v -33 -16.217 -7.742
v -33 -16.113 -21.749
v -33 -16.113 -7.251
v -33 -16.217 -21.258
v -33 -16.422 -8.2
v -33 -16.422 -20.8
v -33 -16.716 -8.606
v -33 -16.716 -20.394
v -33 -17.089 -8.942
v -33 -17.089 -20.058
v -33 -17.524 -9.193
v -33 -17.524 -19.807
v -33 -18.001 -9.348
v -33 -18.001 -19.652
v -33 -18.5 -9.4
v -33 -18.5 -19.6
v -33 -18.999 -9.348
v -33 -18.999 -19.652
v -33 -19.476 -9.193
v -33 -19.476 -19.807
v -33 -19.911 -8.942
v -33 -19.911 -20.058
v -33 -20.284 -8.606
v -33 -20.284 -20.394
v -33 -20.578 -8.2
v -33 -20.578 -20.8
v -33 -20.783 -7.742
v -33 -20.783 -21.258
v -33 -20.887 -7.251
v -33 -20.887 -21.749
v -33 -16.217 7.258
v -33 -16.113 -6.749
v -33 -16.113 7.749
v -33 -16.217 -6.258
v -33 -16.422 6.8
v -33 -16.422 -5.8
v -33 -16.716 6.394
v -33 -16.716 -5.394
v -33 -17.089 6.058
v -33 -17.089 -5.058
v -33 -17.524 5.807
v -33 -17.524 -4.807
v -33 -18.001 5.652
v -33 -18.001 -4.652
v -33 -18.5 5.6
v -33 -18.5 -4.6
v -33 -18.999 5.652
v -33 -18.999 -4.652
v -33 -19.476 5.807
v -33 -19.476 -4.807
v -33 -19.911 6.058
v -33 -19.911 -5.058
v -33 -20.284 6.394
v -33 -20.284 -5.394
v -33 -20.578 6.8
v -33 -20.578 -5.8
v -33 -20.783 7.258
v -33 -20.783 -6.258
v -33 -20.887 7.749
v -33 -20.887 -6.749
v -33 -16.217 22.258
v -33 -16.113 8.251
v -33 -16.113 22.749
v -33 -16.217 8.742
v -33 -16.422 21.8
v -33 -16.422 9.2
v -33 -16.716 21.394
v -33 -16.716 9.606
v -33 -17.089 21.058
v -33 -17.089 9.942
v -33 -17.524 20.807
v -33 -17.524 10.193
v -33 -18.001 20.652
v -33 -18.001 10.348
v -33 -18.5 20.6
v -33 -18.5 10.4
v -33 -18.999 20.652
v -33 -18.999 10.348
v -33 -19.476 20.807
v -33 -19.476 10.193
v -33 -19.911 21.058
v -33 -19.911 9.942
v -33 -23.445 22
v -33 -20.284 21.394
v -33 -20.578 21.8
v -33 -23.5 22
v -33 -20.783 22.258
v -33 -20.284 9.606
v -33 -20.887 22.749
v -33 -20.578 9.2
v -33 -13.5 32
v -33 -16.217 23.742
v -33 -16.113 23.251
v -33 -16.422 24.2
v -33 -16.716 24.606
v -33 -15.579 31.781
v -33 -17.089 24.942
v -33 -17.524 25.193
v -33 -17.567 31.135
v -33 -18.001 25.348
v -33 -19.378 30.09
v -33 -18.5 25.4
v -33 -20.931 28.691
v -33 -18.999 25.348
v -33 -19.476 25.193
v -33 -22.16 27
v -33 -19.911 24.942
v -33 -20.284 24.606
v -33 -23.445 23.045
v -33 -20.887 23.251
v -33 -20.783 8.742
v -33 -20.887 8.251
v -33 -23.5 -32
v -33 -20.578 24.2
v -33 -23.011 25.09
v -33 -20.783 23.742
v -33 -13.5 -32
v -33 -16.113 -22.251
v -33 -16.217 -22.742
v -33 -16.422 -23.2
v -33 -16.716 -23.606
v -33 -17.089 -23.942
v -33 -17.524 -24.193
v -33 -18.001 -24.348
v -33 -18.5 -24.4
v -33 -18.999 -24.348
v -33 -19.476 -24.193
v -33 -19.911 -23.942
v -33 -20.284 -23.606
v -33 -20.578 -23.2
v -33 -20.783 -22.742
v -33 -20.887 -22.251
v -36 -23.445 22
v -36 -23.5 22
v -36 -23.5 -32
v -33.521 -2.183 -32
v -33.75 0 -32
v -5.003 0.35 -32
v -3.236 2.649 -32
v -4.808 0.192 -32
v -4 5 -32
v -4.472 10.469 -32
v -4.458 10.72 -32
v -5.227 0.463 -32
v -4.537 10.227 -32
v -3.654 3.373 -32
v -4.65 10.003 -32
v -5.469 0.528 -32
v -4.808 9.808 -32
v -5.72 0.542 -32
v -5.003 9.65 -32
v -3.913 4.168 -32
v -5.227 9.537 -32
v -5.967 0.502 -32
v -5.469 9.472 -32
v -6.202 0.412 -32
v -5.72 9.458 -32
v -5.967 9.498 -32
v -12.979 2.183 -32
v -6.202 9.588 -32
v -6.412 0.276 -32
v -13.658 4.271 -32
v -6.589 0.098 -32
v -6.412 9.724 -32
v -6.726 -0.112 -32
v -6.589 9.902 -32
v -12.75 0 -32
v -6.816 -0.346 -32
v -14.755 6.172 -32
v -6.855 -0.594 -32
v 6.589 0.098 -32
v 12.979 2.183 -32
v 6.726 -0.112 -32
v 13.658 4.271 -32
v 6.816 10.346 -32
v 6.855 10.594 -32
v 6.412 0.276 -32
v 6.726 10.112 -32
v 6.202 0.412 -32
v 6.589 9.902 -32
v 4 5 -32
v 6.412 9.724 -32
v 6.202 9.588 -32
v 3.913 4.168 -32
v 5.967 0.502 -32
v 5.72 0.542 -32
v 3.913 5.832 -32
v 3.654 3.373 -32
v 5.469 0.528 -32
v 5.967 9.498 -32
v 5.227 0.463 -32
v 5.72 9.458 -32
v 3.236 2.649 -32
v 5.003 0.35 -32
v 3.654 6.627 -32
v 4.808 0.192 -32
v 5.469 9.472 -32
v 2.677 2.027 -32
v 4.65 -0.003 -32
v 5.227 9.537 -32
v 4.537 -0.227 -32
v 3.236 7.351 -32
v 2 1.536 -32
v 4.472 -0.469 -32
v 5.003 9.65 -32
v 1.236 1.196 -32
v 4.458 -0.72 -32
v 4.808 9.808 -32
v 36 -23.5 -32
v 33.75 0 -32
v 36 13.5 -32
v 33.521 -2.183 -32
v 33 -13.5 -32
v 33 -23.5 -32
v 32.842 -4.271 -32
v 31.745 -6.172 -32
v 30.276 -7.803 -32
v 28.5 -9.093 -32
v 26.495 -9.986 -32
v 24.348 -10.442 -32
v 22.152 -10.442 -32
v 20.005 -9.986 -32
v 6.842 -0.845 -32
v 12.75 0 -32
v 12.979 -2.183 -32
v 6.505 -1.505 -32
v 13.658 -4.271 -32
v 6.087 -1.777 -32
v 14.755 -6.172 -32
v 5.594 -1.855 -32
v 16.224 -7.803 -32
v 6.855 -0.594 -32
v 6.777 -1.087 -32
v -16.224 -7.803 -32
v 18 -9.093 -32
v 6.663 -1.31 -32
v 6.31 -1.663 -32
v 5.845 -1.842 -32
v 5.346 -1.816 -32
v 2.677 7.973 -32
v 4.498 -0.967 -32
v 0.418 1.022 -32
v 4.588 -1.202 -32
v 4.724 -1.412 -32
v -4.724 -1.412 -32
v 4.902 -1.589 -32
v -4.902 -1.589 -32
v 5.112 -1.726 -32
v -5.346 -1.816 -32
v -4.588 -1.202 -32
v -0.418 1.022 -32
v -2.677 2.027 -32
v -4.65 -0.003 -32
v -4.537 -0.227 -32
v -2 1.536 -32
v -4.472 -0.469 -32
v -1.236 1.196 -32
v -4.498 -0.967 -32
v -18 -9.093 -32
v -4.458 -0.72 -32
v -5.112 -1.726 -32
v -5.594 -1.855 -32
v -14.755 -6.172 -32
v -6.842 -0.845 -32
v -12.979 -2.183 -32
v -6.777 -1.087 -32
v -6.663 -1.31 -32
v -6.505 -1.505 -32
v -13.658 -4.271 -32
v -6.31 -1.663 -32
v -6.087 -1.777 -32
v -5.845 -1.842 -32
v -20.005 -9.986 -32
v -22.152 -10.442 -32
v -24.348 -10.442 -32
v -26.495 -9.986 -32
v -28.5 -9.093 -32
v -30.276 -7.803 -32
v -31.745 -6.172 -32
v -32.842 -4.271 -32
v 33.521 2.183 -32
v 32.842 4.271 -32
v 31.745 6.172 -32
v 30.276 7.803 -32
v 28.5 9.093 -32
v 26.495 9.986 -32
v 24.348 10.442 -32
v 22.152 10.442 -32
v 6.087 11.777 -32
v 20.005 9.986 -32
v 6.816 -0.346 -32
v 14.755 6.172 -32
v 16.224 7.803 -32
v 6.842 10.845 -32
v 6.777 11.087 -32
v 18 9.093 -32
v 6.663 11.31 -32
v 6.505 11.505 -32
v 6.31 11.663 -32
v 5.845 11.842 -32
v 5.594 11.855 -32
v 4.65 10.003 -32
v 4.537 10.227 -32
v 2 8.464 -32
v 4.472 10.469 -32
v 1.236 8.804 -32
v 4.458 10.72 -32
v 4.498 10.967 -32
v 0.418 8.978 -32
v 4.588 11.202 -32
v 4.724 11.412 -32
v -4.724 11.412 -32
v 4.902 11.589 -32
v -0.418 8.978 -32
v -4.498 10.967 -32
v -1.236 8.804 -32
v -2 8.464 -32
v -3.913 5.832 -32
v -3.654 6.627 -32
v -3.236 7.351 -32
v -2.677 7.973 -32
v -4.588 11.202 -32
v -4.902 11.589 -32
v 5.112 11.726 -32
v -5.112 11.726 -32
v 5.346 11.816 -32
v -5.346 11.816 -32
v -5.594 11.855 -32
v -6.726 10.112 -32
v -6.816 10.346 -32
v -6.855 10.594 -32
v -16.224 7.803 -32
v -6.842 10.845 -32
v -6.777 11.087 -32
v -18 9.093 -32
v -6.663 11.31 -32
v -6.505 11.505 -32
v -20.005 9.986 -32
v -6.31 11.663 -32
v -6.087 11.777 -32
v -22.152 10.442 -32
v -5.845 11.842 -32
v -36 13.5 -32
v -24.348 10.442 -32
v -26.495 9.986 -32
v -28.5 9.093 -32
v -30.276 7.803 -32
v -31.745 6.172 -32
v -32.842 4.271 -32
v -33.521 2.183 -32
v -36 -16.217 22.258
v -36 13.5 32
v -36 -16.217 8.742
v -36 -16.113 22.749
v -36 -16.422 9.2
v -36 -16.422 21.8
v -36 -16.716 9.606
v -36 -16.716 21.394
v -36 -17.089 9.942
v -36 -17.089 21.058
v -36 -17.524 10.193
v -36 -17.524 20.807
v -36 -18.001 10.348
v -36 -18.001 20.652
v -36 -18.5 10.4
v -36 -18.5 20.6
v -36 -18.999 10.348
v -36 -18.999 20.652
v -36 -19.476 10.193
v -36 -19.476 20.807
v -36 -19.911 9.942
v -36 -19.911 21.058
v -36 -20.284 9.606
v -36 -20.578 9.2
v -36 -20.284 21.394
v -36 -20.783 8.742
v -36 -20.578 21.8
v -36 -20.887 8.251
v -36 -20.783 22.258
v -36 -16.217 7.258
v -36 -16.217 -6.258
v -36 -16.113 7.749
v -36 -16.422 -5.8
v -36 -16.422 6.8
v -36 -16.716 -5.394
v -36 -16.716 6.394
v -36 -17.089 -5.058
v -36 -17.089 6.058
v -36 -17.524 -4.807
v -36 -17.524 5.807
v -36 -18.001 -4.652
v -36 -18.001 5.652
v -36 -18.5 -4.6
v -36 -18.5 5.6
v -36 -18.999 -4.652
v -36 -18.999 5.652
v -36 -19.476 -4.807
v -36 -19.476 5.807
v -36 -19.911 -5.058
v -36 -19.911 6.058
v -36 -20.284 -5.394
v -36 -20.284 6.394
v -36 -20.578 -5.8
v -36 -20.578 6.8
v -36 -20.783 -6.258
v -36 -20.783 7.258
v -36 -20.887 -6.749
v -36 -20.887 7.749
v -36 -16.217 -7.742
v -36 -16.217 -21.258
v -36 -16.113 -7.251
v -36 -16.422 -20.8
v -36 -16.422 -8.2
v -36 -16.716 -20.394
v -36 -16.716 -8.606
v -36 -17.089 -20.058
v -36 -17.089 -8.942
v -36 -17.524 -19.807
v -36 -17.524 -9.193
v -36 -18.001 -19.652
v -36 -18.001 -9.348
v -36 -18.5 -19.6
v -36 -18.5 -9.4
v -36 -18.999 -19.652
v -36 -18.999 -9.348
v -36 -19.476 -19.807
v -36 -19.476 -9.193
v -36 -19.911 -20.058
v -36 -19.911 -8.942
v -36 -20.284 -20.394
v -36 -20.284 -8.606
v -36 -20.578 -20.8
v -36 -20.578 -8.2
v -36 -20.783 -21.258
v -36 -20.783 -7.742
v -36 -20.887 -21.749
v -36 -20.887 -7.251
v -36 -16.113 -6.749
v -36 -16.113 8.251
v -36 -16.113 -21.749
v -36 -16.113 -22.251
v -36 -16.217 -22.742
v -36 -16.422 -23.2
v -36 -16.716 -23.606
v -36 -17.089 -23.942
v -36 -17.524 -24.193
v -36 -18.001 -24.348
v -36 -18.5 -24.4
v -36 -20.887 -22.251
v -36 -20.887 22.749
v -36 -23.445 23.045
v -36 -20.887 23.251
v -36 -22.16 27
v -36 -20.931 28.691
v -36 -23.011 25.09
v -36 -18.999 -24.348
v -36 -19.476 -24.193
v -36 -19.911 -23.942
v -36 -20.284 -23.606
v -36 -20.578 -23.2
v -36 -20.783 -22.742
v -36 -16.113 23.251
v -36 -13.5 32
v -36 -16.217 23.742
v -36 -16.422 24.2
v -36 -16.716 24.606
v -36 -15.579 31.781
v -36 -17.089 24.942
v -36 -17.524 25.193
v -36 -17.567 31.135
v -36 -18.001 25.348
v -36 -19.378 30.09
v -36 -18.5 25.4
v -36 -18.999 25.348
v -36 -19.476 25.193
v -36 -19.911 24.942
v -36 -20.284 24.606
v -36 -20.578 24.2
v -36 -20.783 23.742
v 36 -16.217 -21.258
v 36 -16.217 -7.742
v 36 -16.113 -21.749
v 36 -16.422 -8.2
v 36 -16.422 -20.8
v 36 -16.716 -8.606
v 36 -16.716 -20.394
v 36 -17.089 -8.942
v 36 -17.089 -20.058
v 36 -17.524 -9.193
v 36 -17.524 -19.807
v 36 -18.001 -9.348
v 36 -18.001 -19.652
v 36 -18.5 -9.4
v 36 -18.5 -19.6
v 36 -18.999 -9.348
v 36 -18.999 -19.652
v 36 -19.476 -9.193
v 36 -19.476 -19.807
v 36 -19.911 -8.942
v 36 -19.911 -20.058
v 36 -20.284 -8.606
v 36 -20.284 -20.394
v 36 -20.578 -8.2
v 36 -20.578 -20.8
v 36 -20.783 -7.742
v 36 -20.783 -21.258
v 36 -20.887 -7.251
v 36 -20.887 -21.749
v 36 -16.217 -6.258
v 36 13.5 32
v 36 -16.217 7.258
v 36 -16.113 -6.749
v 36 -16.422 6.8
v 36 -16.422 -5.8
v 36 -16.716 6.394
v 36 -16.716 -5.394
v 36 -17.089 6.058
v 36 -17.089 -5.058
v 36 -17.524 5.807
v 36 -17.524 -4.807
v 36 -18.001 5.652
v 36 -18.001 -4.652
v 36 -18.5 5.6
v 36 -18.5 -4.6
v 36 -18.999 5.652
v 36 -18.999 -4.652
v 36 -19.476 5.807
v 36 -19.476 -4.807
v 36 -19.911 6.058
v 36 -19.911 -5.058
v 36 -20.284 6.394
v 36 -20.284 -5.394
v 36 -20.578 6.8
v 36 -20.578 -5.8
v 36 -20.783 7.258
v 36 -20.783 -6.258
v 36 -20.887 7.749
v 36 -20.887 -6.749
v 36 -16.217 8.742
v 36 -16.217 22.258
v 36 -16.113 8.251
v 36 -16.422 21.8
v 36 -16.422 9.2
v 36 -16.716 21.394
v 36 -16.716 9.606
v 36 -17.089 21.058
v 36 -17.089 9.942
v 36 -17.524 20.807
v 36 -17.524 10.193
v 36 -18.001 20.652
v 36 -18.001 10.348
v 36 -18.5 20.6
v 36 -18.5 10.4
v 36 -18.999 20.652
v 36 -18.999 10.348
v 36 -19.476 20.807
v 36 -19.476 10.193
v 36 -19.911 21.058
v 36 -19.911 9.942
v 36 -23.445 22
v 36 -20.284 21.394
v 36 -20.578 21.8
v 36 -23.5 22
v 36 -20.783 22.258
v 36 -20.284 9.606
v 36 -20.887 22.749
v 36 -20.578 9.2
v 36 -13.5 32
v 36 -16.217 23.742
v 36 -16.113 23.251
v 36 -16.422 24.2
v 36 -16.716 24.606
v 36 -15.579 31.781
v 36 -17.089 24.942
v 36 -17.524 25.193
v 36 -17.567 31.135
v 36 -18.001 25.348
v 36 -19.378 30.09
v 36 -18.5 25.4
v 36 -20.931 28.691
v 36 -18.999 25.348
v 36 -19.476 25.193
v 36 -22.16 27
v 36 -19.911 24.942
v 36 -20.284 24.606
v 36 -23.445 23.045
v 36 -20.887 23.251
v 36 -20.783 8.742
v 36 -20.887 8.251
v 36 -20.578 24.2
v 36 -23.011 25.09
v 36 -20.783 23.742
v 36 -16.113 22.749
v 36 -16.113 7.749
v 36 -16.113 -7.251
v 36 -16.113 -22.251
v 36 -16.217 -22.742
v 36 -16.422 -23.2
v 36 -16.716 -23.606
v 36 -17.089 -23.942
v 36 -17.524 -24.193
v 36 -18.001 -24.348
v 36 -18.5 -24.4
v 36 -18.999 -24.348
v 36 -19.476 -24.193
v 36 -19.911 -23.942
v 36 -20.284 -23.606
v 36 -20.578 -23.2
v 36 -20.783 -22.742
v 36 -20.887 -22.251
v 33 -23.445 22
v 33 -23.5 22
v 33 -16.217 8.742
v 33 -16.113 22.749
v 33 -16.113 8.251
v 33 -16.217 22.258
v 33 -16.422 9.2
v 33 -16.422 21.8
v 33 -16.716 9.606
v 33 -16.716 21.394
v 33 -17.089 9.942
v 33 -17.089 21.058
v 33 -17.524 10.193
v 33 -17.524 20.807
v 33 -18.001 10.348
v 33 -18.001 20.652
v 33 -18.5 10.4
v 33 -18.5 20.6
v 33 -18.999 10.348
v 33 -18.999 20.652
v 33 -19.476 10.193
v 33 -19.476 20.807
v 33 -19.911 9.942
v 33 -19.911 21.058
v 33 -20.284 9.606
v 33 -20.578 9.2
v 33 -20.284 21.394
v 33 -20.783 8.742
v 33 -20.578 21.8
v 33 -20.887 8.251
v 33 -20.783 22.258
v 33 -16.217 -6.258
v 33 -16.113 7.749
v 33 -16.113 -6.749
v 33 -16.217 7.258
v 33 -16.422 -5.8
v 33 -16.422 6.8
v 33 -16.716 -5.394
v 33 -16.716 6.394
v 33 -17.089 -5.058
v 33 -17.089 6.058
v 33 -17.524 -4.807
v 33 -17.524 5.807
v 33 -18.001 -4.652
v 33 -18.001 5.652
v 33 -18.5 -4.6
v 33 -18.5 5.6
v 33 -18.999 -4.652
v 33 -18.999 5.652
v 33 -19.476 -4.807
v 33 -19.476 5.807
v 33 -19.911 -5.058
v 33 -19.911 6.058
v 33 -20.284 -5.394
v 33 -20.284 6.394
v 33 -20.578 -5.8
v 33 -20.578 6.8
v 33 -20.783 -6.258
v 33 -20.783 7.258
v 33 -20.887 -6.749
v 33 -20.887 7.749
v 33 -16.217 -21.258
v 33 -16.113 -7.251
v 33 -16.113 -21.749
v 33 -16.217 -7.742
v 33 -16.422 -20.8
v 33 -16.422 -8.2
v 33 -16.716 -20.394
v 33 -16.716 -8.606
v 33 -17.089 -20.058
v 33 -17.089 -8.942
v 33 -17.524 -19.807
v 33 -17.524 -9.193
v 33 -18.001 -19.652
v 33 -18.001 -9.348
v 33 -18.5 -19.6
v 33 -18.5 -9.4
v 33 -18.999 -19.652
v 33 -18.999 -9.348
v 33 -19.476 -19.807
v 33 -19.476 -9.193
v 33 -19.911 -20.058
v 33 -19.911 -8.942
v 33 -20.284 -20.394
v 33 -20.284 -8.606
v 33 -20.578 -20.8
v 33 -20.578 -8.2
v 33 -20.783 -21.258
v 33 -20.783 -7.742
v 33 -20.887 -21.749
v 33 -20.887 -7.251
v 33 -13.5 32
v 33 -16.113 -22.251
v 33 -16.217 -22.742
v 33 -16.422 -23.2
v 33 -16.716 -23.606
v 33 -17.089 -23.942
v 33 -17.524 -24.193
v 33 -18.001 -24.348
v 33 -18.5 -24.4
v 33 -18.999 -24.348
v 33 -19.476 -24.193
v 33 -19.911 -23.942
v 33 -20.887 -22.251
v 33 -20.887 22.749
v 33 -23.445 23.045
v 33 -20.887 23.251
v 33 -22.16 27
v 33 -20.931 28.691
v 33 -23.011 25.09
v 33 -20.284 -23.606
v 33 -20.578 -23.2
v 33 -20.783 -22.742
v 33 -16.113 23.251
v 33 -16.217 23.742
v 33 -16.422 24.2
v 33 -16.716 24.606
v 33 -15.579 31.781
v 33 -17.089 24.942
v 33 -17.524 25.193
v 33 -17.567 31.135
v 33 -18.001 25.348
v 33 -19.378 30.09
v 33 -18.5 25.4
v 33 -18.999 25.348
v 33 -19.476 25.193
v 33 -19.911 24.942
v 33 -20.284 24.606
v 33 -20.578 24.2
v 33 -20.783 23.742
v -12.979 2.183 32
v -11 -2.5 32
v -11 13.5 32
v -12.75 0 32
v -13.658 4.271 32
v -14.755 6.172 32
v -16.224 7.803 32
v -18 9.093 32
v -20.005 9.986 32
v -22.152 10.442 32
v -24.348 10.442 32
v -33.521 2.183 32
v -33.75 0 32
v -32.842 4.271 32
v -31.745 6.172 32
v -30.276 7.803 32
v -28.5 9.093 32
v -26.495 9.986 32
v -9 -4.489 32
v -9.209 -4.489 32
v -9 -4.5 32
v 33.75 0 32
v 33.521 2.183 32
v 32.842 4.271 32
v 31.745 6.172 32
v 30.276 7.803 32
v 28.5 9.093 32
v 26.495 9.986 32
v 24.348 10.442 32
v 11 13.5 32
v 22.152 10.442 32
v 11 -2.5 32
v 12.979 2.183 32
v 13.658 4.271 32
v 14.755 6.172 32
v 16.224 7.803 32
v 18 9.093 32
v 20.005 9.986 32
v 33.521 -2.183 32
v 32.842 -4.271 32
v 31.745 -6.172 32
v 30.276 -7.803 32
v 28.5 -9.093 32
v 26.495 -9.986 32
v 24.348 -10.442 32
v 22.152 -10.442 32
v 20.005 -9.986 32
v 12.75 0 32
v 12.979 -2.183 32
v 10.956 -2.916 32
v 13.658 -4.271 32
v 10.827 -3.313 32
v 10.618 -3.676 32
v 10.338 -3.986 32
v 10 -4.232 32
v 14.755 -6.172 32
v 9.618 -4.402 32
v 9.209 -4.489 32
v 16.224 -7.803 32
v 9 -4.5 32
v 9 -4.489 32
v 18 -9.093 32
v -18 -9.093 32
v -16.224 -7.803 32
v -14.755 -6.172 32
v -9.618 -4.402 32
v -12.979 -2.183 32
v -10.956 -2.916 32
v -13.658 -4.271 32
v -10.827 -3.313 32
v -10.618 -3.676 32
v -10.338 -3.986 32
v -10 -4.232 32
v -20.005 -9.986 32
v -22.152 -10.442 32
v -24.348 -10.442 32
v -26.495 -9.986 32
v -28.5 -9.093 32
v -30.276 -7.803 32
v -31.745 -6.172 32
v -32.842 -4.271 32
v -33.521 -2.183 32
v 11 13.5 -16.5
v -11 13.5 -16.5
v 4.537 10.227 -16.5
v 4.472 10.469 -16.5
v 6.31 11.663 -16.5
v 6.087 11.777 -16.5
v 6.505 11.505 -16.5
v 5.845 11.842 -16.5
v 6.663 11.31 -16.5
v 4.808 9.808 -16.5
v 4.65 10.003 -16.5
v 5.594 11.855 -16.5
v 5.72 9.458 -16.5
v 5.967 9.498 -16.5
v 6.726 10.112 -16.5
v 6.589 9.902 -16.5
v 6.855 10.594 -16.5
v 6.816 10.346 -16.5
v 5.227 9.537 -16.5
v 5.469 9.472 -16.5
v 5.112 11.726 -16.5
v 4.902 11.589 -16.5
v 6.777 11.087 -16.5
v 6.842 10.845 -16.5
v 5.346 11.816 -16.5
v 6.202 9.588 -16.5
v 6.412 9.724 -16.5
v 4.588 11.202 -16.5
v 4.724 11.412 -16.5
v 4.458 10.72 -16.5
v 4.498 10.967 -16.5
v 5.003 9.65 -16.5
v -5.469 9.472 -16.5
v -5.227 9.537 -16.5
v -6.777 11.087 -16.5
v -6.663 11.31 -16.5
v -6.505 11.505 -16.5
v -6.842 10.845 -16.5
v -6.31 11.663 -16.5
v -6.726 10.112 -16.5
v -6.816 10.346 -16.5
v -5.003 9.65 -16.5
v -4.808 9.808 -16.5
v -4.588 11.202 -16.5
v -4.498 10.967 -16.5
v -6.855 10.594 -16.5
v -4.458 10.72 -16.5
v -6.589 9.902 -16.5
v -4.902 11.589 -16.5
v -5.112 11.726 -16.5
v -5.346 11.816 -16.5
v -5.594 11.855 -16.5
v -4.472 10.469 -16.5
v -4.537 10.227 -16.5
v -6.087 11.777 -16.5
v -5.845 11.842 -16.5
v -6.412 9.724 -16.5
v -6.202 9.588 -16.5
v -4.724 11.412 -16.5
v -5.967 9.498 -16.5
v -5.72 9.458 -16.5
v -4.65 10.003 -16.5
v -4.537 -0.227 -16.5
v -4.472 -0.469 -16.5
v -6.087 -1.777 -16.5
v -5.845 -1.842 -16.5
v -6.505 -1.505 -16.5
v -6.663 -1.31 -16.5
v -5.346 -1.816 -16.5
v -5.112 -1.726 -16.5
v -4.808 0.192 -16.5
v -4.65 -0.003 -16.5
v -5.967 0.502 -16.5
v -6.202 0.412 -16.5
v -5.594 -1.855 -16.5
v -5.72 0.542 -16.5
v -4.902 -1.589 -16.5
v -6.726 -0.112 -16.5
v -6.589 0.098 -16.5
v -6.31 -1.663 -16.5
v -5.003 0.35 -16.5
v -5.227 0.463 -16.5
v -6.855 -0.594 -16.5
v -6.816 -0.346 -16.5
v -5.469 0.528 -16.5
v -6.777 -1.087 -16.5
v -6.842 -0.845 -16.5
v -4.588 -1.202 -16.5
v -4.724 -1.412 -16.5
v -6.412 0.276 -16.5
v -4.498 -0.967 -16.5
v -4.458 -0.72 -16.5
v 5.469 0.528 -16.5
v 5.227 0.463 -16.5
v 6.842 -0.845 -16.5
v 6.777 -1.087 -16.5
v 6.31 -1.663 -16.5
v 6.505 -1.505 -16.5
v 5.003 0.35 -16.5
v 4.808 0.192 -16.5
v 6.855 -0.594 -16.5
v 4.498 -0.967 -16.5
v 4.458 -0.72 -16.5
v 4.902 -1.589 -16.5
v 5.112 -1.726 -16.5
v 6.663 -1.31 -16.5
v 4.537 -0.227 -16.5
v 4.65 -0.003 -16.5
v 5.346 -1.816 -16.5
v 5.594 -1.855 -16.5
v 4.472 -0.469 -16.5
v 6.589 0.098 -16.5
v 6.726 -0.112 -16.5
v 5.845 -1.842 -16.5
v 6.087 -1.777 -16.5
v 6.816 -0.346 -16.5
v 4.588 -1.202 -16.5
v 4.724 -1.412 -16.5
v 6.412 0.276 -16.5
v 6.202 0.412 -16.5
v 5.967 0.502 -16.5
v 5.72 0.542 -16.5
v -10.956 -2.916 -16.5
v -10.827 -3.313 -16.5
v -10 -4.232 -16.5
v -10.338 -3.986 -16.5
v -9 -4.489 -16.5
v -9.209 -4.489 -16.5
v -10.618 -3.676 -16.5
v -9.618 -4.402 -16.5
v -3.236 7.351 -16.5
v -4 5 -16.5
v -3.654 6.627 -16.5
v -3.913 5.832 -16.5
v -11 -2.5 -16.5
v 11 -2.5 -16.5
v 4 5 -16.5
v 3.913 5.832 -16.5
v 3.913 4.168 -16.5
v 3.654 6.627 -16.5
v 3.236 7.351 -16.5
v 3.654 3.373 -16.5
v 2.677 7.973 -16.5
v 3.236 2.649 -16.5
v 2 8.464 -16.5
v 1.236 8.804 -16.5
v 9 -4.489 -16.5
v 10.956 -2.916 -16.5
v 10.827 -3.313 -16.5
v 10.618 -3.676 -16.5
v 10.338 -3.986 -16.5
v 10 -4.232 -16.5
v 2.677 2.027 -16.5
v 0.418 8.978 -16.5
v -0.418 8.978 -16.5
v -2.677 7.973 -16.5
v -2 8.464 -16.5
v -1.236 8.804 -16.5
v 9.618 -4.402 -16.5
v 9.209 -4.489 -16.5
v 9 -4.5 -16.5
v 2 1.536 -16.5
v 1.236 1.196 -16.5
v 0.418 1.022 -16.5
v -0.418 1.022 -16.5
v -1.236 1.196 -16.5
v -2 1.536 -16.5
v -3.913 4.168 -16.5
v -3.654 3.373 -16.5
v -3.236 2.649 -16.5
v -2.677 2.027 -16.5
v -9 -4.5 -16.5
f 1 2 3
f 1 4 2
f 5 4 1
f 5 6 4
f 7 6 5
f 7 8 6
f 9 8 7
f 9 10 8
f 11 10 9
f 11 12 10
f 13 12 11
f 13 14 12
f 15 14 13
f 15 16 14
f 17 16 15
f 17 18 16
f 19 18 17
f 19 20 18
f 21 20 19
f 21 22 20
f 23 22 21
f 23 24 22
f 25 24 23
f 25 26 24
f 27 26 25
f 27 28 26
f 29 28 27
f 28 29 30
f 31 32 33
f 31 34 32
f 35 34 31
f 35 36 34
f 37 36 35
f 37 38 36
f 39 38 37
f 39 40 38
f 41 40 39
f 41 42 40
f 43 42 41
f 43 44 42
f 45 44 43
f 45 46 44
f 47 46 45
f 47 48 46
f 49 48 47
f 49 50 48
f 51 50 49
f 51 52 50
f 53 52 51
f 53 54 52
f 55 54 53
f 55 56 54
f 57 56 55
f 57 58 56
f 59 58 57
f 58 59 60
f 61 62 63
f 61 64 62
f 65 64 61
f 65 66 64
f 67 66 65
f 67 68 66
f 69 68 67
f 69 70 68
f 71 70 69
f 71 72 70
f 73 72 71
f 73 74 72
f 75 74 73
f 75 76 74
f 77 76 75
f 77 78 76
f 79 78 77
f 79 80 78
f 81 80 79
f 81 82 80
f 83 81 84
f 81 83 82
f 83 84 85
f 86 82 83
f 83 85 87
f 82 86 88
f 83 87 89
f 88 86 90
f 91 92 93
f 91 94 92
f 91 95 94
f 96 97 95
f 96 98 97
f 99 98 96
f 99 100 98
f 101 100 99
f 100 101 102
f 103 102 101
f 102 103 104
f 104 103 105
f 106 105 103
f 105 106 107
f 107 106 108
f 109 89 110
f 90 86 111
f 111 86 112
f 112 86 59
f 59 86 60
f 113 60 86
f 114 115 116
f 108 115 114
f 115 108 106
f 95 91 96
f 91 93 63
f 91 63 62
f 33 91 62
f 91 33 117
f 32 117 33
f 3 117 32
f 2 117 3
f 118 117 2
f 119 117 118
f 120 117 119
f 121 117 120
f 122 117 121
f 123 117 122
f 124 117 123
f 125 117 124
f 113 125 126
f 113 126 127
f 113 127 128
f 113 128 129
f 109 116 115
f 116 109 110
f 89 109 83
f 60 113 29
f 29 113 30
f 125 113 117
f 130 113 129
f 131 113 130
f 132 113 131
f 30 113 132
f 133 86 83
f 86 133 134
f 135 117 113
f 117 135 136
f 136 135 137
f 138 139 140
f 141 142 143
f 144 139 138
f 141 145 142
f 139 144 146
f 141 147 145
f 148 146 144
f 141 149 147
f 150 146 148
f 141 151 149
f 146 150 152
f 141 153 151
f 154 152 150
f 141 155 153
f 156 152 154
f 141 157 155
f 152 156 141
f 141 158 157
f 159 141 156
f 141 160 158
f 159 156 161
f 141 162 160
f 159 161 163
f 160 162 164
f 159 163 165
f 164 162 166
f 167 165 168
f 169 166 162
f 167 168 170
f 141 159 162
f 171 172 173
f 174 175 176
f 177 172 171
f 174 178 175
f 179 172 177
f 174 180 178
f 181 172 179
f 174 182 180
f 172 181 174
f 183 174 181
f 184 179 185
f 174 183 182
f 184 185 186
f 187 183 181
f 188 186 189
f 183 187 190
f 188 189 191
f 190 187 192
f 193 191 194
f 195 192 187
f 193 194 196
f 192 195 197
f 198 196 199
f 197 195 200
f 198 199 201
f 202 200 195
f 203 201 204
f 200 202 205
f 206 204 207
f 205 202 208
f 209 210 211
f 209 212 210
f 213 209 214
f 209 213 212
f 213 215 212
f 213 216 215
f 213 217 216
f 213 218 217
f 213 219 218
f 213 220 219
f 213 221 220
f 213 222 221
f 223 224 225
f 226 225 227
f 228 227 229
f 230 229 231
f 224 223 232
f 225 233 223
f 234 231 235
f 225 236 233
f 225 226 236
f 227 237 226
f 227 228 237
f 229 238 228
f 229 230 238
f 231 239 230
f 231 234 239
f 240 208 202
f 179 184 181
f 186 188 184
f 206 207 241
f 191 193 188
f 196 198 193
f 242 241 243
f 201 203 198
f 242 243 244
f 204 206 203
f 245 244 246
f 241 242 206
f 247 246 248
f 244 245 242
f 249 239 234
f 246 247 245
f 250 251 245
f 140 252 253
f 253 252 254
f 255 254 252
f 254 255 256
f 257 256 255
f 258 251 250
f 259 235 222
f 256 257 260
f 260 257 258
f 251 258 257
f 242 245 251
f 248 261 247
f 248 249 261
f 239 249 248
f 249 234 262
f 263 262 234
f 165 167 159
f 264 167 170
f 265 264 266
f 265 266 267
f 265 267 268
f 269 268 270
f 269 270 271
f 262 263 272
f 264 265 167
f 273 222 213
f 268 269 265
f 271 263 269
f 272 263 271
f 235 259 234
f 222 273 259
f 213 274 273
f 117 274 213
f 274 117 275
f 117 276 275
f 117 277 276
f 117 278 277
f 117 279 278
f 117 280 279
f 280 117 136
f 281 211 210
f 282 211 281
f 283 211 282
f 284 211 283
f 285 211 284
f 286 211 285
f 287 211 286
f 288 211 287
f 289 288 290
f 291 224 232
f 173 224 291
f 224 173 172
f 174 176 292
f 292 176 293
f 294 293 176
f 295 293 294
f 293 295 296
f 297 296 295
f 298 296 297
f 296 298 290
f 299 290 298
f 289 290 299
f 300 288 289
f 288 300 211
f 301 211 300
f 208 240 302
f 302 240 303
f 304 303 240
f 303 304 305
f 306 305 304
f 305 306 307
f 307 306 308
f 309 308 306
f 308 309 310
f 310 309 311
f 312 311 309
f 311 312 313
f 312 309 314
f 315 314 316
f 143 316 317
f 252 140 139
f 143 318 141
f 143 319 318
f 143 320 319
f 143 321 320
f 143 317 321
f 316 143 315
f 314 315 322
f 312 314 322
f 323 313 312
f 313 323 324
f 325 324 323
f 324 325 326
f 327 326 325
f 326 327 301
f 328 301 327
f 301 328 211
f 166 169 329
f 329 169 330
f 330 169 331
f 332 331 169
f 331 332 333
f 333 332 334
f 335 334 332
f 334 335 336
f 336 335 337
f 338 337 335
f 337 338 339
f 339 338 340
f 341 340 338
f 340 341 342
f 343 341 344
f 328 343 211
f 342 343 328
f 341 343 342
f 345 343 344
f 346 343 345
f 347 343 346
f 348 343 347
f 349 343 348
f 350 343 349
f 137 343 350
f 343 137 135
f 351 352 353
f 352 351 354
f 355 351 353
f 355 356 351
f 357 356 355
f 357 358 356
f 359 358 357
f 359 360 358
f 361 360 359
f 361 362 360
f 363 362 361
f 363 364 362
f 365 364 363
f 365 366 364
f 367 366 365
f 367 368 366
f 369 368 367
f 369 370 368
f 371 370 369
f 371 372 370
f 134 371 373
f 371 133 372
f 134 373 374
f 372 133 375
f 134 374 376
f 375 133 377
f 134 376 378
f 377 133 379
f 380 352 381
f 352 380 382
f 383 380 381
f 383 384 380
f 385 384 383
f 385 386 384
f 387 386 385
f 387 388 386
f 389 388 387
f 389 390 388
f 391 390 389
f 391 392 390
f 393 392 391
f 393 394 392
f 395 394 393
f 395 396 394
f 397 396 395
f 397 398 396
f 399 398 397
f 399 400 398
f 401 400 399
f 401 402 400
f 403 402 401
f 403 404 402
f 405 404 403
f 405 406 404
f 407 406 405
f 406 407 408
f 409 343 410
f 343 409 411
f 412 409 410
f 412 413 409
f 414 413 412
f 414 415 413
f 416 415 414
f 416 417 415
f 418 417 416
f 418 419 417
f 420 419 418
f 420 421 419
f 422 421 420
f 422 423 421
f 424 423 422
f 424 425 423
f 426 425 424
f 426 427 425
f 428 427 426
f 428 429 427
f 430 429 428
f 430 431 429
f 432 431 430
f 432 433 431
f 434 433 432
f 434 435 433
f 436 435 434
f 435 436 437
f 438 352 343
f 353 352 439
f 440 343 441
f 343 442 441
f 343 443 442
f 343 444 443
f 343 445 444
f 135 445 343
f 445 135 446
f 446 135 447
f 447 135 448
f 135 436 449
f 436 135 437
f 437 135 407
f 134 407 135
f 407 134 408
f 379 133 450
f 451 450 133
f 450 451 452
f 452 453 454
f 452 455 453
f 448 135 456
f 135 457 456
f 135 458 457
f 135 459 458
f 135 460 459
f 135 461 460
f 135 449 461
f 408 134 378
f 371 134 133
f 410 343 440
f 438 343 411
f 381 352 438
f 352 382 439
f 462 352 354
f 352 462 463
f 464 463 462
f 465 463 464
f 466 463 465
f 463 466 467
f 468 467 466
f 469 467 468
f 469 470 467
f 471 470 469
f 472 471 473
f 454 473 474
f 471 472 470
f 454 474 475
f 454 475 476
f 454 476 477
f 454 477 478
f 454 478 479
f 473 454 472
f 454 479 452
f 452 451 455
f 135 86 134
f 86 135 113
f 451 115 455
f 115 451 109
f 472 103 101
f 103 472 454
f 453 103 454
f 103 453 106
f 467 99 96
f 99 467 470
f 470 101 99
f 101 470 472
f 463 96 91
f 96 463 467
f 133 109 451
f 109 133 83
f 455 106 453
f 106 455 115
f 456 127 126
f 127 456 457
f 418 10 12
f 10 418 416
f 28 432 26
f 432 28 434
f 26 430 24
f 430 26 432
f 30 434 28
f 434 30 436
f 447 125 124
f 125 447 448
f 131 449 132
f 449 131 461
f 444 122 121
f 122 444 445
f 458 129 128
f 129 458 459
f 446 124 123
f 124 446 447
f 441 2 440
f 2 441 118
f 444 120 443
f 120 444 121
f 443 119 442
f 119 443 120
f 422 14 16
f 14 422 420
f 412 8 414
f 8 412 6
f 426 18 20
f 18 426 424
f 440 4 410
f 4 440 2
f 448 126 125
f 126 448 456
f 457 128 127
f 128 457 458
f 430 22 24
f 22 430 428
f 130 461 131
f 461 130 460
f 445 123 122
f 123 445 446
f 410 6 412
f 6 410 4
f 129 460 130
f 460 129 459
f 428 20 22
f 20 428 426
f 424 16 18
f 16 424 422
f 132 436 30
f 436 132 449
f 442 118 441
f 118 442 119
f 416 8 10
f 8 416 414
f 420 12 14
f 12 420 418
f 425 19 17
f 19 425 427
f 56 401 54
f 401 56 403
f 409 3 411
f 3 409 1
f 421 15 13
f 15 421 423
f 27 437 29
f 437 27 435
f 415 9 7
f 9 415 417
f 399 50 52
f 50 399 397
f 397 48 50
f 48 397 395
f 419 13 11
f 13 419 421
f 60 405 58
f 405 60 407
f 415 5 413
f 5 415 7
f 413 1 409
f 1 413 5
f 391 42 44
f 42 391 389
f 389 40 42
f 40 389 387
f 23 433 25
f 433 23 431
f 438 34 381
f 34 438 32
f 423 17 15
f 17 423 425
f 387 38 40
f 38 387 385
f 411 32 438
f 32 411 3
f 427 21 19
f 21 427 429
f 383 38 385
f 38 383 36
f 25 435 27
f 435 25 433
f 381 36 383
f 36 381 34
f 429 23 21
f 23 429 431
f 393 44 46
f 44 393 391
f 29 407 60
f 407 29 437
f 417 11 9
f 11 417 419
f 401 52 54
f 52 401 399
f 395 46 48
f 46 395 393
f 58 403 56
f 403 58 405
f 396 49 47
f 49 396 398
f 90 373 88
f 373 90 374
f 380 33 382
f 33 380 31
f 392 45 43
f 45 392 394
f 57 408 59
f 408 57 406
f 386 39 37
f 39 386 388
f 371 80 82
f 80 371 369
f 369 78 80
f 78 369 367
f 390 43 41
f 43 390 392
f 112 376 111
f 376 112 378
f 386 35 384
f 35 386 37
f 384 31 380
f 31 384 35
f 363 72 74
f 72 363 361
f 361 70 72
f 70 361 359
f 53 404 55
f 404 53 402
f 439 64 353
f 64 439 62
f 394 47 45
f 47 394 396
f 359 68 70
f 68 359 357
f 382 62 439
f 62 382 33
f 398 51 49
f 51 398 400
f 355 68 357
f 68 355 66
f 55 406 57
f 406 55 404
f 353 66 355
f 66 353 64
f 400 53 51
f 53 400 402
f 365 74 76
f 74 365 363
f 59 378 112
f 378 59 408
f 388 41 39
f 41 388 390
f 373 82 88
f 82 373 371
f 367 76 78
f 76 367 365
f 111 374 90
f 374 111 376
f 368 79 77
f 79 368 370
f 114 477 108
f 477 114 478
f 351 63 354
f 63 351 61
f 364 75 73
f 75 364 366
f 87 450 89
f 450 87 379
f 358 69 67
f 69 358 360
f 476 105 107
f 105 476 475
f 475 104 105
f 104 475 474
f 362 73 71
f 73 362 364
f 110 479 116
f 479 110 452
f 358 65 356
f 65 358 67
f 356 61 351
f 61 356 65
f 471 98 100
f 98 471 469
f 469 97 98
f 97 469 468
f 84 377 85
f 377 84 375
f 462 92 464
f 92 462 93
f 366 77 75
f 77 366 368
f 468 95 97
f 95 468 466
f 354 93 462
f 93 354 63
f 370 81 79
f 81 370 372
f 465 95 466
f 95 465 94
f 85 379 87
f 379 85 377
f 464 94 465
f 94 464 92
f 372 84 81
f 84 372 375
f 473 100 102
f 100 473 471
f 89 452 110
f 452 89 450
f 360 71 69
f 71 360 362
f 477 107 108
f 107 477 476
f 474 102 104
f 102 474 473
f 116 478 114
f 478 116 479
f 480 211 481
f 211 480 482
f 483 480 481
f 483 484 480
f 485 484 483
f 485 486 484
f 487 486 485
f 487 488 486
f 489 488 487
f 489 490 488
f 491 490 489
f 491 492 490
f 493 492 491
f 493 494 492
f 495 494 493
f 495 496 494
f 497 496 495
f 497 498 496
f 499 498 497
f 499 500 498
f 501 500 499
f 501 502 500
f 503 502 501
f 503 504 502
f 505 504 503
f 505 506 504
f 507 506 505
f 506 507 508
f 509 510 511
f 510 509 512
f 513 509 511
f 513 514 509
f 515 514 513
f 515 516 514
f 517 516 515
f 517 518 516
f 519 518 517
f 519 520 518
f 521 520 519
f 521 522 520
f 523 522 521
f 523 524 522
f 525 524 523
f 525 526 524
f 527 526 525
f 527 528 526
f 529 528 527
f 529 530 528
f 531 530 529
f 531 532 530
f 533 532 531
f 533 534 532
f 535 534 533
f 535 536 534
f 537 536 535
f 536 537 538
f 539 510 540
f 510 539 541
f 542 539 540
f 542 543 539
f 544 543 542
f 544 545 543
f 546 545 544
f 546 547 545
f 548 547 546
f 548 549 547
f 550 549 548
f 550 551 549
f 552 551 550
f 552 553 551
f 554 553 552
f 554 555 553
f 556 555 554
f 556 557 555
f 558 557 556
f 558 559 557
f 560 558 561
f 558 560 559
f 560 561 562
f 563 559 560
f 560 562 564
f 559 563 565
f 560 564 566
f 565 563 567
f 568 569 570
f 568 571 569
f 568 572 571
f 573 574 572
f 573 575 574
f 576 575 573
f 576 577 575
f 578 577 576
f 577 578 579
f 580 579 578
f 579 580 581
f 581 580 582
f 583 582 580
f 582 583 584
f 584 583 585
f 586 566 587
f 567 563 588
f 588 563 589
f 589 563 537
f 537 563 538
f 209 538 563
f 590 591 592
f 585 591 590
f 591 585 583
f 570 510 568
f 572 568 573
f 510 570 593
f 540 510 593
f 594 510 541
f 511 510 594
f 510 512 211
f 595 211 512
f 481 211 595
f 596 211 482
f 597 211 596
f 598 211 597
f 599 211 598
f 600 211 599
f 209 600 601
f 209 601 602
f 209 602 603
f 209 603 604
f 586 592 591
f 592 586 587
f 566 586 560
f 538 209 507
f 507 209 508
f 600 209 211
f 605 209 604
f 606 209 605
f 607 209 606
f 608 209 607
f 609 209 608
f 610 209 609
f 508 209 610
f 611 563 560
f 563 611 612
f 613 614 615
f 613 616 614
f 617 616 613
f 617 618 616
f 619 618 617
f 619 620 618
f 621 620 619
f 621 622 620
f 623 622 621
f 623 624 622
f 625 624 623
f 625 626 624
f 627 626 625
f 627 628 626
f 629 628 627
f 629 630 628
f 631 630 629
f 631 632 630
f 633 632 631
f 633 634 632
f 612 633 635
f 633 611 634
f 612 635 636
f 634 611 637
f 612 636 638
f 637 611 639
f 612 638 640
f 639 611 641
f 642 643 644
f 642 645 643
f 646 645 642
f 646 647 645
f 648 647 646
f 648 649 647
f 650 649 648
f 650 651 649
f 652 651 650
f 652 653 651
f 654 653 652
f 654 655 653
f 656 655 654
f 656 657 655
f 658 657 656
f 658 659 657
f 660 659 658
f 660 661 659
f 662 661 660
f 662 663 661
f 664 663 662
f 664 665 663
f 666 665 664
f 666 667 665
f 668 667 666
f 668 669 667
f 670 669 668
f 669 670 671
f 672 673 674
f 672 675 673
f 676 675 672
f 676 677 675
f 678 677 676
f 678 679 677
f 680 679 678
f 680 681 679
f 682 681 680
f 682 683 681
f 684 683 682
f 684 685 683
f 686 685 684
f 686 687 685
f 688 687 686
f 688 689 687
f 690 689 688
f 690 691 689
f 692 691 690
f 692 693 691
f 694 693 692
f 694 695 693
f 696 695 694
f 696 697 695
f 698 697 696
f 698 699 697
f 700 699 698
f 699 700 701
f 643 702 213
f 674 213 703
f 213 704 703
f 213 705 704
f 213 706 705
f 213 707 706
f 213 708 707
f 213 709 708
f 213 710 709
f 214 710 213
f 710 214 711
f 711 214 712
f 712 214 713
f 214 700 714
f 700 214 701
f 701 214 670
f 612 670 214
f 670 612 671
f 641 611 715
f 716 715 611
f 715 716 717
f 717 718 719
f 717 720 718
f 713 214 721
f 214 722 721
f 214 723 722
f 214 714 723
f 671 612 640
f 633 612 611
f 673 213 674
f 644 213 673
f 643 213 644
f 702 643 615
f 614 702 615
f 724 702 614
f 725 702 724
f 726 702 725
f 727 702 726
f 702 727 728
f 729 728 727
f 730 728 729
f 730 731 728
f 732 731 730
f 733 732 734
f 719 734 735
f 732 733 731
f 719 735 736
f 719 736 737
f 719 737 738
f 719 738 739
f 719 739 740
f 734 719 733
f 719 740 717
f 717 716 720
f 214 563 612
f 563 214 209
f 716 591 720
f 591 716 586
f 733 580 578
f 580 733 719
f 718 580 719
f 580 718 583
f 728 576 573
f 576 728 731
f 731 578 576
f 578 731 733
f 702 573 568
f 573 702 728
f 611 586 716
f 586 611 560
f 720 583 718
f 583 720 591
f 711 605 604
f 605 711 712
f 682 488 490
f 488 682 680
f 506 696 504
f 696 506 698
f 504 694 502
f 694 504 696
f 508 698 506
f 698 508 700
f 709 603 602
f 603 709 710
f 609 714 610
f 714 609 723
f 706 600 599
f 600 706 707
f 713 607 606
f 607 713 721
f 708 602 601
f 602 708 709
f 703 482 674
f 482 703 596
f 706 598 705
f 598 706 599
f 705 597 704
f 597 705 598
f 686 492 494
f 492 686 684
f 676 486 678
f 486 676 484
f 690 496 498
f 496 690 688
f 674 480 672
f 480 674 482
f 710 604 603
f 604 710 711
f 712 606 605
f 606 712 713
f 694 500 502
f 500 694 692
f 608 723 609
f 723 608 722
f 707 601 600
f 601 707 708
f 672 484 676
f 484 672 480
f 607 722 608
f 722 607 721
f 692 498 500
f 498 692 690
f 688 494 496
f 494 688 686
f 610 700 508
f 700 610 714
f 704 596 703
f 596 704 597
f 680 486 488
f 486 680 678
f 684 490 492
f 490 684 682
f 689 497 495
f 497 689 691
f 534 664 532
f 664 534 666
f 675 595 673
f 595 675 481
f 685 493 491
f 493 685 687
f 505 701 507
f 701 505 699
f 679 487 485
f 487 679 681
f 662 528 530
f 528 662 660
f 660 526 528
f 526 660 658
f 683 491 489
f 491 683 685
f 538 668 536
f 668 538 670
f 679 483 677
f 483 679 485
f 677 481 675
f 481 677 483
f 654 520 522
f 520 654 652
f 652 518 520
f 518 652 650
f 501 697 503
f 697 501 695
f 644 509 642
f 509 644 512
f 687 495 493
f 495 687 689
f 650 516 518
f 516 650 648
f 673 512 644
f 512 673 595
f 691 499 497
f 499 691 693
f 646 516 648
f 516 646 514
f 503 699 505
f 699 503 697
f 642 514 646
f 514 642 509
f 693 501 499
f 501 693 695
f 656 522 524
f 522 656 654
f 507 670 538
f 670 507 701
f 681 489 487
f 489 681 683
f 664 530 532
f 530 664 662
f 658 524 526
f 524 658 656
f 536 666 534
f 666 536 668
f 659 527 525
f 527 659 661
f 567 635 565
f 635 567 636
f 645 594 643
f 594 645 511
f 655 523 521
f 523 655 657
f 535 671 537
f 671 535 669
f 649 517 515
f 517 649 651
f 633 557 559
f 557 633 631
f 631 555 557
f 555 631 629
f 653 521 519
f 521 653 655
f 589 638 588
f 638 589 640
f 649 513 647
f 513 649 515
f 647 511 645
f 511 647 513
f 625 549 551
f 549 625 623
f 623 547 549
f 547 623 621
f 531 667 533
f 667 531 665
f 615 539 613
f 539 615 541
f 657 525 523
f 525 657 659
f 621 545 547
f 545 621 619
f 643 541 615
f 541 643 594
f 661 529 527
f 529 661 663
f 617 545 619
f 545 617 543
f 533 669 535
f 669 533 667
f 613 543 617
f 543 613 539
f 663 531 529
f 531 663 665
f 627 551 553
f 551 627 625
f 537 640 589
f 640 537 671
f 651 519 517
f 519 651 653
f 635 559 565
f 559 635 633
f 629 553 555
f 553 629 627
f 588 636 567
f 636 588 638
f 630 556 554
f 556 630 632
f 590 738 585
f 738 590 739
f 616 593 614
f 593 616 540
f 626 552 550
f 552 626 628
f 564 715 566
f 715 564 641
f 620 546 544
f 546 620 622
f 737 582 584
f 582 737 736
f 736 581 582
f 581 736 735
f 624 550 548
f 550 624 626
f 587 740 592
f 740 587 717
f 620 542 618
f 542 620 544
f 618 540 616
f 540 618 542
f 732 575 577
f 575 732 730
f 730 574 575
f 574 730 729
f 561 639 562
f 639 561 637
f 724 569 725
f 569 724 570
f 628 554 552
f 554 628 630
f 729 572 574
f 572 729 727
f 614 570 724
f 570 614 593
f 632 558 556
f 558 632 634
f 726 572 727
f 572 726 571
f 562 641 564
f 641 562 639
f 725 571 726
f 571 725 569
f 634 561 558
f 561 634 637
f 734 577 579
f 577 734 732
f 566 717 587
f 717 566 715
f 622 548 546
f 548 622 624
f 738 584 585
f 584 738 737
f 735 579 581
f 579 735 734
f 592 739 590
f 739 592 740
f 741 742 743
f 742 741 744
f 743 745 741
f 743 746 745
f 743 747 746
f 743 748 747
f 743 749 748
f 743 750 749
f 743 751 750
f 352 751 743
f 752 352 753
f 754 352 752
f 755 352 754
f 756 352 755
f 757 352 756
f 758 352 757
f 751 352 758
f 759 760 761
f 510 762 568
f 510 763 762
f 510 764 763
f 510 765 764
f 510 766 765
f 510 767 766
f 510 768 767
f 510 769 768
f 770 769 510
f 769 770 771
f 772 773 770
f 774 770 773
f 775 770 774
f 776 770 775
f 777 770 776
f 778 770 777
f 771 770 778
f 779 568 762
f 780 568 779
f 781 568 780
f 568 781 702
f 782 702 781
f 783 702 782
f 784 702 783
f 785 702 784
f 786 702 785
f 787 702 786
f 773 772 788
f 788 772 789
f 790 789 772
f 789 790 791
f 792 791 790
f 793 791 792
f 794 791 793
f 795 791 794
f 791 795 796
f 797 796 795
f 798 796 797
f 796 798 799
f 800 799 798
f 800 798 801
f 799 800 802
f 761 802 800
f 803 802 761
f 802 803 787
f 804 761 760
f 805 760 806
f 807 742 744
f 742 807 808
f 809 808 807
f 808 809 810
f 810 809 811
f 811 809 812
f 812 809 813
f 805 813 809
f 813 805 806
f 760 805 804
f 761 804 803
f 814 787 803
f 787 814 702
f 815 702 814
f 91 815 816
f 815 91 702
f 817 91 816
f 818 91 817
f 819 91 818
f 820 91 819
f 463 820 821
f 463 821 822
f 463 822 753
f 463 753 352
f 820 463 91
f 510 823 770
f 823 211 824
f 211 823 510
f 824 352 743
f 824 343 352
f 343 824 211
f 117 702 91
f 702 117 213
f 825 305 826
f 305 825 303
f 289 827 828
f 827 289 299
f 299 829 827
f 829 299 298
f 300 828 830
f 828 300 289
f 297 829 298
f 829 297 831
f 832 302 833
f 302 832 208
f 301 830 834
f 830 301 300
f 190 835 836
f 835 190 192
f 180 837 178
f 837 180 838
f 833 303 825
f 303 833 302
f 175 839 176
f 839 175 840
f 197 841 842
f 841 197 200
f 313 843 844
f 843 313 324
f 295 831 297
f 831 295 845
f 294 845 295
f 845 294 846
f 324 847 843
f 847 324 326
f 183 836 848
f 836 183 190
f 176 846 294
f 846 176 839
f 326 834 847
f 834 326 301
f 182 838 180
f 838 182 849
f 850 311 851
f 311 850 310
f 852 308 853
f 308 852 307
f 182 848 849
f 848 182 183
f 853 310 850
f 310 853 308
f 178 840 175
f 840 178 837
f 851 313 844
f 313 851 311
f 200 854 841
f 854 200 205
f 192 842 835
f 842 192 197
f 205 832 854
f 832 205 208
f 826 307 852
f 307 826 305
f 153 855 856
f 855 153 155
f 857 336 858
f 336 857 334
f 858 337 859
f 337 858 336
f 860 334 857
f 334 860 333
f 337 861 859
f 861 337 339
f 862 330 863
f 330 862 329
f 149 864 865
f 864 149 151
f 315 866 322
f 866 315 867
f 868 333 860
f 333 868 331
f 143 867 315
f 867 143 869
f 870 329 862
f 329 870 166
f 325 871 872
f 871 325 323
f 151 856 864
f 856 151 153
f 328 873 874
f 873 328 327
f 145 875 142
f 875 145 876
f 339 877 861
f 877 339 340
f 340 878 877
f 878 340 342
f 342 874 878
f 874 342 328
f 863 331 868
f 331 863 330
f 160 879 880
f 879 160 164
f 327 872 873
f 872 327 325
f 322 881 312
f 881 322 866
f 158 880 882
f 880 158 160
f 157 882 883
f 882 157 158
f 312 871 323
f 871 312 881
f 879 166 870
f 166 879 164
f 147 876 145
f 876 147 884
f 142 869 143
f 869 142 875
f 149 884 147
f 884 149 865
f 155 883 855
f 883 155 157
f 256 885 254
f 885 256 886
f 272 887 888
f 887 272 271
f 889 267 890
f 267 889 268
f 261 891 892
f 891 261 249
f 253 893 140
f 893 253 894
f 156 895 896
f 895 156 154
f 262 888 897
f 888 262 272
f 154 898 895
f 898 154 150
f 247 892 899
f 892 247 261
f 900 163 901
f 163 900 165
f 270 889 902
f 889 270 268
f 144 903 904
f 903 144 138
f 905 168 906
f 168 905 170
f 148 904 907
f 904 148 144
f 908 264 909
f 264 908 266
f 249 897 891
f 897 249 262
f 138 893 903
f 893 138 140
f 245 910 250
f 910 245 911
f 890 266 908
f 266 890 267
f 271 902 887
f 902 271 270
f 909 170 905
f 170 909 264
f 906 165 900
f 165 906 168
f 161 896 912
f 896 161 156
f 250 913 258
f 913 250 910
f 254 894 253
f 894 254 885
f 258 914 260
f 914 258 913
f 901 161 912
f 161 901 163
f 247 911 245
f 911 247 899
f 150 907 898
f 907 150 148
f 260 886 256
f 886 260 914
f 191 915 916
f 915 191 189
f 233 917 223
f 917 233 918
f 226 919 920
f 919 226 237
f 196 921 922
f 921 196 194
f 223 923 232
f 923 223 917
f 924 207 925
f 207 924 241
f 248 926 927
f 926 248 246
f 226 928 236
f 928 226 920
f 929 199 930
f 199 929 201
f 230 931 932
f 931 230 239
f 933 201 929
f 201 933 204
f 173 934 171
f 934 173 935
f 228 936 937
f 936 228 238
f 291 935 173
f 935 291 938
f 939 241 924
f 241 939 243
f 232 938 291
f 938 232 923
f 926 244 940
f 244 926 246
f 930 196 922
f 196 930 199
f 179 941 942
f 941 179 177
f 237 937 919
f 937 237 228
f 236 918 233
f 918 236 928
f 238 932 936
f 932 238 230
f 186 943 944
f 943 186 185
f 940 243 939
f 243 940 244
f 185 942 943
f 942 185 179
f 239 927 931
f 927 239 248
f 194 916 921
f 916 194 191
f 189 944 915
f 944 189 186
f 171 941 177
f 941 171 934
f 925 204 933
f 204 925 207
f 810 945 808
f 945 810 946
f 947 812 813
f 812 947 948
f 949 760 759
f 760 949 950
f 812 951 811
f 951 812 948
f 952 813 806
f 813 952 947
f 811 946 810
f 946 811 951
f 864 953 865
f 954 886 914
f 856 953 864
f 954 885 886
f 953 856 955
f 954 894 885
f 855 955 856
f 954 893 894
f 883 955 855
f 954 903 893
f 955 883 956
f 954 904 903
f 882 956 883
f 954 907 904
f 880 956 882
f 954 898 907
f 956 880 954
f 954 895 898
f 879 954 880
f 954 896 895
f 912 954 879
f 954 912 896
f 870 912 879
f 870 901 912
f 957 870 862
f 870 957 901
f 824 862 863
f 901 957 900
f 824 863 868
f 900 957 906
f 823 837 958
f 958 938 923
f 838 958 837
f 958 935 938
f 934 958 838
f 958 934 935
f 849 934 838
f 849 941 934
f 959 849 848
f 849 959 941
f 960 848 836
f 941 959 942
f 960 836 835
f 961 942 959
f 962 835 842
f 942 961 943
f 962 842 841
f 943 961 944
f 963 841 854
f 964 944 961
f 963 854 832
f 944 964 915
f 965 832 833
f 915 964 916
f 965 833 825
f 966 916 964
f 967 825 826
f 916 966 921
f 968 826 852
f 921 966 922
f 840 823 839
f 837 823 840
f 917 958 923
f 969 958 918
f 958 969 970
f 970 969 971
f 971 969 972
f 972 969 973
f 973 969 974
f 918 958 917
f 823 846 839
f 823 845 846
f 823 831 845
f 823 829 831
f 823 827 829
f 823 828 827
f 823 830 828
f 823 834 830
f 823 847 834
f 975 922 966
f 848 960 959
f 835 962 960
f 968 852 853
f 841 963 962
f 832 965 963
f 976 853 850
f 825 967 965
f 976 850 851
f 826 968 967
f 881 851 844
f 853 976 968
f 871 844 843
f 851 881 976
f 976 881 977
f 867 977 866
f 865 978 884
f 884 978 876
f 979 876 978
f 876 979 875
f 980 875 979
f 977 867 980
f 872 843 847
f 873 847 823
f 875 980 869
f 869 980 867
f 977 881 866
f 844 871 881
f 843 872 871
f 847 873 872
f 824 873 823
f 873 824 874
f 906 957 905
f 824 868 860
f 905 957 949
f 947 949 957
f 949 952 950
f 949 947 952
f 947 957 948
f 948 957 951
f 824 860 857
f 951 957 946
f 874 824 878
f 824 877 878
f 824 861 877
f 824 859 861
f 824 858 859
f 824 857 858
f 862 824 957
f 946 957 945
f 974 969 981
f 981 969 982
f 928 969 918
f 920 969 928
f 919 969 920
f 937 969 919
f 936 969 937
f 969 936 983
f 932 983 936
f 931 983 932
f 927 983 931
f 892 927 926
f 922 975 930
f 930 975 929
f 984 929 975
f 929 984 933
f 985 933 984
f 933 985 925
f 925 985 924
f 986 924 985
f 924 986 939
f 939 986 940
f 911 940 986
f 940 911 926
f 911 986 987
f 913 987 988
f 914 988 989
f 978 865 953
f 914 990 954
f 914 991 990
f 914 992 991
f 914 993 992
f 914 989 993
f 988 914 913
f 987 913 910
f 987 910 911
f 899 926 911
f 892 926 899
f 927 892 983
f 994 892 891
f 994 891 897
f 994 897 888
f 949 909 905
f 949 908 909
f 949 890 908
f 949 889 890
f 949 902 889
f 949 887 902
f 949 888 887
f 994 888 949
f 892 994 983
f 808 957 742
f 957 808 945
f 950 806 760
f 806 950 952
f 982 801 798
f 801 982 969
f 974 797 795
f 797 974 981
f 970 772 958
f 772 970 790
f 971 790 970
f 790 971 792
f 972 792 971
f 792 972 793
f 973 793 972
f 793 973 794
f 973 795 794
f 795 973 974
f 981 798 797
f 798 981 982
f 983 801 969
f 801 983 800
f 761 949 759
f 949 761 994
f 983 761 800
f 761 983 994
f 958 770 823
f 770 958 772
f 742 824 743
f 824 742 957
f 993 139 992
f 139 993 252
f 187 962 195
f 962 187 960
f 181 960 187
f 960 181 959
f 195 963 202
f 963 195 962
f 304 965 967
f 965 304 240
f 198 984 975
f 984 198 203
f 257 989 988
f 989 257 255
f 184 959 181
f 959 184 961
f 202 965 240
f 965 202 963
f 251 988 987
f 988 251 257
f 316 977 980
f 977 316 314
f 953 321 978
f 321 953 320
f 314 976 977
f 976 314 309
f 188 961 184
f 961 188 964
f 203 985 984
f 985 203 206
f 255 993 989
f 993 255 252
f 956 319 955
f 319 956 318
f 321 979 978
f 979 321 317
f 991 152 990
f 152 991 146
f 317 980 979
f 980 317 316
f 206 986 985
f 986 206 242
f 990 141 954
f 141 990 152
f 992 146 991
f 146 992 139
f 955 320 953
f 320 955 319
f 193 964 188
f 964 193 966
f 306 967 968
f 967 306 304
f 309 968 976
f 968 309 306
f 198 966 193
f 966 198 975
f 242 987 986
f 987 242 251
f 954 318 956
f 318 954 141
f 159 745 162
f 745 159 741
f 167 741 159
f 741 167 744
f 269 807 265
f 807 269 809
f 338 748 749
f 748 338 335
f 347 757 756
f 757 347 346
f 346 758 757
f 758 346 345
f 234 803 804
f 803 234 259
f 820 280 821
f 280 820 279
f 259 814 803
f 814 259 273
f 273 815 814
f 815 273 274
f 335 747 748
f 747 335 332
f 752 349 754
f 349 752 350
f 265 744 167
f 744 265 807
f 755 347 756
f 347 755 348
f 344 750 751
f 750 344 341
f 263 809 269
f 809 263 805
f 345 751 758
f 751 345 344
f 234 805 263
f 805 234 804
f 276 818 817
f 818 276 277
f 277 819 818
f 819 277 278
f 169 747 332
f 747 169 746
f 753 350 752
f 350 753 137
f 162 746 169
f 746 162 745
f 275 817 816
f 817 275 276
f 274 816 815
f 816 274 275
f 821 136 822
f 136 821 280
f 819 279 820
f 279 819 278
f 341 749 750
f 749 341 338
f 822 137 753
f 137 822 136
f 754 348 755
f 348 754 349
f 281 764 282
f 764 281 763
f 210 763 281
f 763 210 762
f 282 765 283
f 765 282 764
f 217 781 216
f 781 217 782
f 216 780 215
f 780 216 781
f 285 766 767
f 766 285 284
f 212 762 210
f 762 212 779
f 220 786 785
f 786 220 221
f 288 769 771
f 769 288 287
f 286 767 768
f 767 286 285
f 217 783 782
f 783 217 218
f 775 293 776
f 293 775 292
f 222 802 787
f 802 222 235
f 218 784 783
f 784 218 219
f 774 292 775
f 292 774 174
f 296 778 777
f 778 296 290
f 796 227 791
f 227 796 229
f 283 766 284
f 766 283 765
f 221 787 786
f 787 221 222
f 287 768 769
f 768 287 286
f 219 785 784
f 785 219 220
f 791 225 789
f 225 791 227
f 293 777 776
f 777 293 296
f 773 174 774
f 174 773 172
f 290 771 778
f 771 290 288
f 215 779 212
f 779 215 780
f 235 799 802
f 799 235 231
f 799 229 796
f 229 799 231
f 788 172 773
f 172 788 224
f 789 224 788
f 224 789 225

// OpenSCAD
// file: cnc_params.scad
$fn = 40;

wall = 3;

rod_d = 12;
rod_sz = 152;
rod_bearing_d = 21;
rod_bearing_sz = 30;
rod_rod_dist = 34+rod_bearing_d;
rod_bearing_pos_z = [15+12/2, 15 + 12/2 + rod_rod_dist + 12/2];
lead_screw_d = 8;
lead_screw_bearing_d = 22;
lead_screw_bearing_sz = 7;
lead_screw_nut_d = 11.6;
lead_screw_nut_pos_z = rod_bearing_pos_z[0] + 20.5 + 8/2 + 12/2;
lead_screw_nut_hole_d = 2.4;
lead_screw_nut_hole_r_dist = 8;

echo("rod 1-lead ", lead_screw_nut_pos_z-rod_bearing_pos_z[0], ", lead to  rod2 ", lead_screw_nut_pos_z - rod_bearing_pos_z[1]);

base_sz_x = rod_bearing_sz * 2 + 2 * wall;
base_sz_y = rod_bearing_d + 6; // shortest
base_sz_z = rod_sz+wall*2;

//28 65
echo("base x: ", base_sz_x, ", base y:", base_sz_y);

hole_d = 3.8;
hole_d_through = 4.8;
mounting_hole_offset = 5;

motor_sz = 43;
motor_d = 24;
motor_hole_dist = 30.2;
rod_distance = 66.2 - rod_bearing_d; //rod_distance/2 = 23.25??? (66.2 - 21)/2 = 45.2/2 = 22.6 !!!
// motor shift from rod axis
motor_shift_y = 5;

top_block_sz_x = base_sz_x + 2 * wall;
top_block_sz_y = motor_sz + 4 * wall + base_sz_y;
top_block_sz_z = 10;

bottom_block_sz_x = top_block_sz_x;
bottom_block_sz_y = top_block_sz_y - 10;
bottom_block_sz_z = lead_screw_bearing_sz + wall;
// main file
include <cnc_params.scad>
use <MCAD/boxes.scad>

$fn = 30;

gantry_sz_x = base_sz_x + 2 * wall;
gantry_sz_y = rod_bearing_d + 2 * wall;
gantry_sz_z = rod_bearing_sz * 2 + 4;

attach_sz_x = wall;
attach_sz_y = 20;
attach_sz_z = gantry_sz_z-10;

extract_sz_x = lead_screw_nut_hole_r_dist * 2 + 2 * wall;
extract_sz_y = extract_sz_x;
extract_sz_z = gantry_sz_z - 15;

module vert_rod_holes(d=rod_d, h=top_block_sz_z, z_off=0) {
	for(xpos=[-1,1]) {
		// rod holes
		translate([xpos*23.25, 0, z_off]) {
			cylinder(d=d, h=h, center=true);
		}
	}
}

module gantry() {
	difference() {
		union() {
			cube([gantry_sz_x, gantry_sz_y, gantry_sz_z], center=true);
			// attachment
			for(xsgn=[-1,1]) {
        translate([xsgn*(gantry_sz_x-attach_sz_x)/2, -gantry_sz_y/2, -(gantry_sz_z-attach_sz_z)/2]) {
          difference() {
            union() {
              cube([attach_sz_x, attach_sz_y, attach_sz_z], center=true);
              translate([0, 0, attach_sz_z/2]) {
                rotate([0, 90, 0]) {
                  cylinder(d=(gantry_sz_z-attach_sz_z)*2, h=attach_sz_x, center=true);
                }
              }
            }
            translate([0, -attach_sz_y/4, -attach_sz_z/2]) {
              for(zpos=[10, 25, 40, 55]) {
                translate([0, 0, zpos]) {
                  rotate([0, 90, 0]) {
                    cylinder(d=hole_d_through, h=attach_sz_x*2, center=true);
                  }
                }
              }
            }
					}
				}
			}
		}

		translate([0, motor_shift_y, 0]) {
			// motor hole (lead)
			cylinder(d=lead_screw_d, h=gantry_sz_z, center=true);
			// motor hole (lead attachment)
			for(angle=[45:90:345]) {
				rotate([0, 0, angle]) {
					translate([lead_screw_nut_hole_r_dist, 0, 0]) {
						cylinder(d=lead_screw_nut_hole_d, h=gantry_sz_z, center=true);
					}
				}
			}
			// extraction from top
			for(zpos=[1]) {
				translate([0, wall/2, zpos*(gantry_sz_z-extract_sz_z+1)/2]) {
					roundedBox([extract_sz_x, extract_sz_y, extract_sz_z], 2, true);
				}
			}
		}

		// holes for rod bearings
		vert_rod_holes(d=rod_bearing_d, h=gantry_sz_z);
	}
}

gantry();
